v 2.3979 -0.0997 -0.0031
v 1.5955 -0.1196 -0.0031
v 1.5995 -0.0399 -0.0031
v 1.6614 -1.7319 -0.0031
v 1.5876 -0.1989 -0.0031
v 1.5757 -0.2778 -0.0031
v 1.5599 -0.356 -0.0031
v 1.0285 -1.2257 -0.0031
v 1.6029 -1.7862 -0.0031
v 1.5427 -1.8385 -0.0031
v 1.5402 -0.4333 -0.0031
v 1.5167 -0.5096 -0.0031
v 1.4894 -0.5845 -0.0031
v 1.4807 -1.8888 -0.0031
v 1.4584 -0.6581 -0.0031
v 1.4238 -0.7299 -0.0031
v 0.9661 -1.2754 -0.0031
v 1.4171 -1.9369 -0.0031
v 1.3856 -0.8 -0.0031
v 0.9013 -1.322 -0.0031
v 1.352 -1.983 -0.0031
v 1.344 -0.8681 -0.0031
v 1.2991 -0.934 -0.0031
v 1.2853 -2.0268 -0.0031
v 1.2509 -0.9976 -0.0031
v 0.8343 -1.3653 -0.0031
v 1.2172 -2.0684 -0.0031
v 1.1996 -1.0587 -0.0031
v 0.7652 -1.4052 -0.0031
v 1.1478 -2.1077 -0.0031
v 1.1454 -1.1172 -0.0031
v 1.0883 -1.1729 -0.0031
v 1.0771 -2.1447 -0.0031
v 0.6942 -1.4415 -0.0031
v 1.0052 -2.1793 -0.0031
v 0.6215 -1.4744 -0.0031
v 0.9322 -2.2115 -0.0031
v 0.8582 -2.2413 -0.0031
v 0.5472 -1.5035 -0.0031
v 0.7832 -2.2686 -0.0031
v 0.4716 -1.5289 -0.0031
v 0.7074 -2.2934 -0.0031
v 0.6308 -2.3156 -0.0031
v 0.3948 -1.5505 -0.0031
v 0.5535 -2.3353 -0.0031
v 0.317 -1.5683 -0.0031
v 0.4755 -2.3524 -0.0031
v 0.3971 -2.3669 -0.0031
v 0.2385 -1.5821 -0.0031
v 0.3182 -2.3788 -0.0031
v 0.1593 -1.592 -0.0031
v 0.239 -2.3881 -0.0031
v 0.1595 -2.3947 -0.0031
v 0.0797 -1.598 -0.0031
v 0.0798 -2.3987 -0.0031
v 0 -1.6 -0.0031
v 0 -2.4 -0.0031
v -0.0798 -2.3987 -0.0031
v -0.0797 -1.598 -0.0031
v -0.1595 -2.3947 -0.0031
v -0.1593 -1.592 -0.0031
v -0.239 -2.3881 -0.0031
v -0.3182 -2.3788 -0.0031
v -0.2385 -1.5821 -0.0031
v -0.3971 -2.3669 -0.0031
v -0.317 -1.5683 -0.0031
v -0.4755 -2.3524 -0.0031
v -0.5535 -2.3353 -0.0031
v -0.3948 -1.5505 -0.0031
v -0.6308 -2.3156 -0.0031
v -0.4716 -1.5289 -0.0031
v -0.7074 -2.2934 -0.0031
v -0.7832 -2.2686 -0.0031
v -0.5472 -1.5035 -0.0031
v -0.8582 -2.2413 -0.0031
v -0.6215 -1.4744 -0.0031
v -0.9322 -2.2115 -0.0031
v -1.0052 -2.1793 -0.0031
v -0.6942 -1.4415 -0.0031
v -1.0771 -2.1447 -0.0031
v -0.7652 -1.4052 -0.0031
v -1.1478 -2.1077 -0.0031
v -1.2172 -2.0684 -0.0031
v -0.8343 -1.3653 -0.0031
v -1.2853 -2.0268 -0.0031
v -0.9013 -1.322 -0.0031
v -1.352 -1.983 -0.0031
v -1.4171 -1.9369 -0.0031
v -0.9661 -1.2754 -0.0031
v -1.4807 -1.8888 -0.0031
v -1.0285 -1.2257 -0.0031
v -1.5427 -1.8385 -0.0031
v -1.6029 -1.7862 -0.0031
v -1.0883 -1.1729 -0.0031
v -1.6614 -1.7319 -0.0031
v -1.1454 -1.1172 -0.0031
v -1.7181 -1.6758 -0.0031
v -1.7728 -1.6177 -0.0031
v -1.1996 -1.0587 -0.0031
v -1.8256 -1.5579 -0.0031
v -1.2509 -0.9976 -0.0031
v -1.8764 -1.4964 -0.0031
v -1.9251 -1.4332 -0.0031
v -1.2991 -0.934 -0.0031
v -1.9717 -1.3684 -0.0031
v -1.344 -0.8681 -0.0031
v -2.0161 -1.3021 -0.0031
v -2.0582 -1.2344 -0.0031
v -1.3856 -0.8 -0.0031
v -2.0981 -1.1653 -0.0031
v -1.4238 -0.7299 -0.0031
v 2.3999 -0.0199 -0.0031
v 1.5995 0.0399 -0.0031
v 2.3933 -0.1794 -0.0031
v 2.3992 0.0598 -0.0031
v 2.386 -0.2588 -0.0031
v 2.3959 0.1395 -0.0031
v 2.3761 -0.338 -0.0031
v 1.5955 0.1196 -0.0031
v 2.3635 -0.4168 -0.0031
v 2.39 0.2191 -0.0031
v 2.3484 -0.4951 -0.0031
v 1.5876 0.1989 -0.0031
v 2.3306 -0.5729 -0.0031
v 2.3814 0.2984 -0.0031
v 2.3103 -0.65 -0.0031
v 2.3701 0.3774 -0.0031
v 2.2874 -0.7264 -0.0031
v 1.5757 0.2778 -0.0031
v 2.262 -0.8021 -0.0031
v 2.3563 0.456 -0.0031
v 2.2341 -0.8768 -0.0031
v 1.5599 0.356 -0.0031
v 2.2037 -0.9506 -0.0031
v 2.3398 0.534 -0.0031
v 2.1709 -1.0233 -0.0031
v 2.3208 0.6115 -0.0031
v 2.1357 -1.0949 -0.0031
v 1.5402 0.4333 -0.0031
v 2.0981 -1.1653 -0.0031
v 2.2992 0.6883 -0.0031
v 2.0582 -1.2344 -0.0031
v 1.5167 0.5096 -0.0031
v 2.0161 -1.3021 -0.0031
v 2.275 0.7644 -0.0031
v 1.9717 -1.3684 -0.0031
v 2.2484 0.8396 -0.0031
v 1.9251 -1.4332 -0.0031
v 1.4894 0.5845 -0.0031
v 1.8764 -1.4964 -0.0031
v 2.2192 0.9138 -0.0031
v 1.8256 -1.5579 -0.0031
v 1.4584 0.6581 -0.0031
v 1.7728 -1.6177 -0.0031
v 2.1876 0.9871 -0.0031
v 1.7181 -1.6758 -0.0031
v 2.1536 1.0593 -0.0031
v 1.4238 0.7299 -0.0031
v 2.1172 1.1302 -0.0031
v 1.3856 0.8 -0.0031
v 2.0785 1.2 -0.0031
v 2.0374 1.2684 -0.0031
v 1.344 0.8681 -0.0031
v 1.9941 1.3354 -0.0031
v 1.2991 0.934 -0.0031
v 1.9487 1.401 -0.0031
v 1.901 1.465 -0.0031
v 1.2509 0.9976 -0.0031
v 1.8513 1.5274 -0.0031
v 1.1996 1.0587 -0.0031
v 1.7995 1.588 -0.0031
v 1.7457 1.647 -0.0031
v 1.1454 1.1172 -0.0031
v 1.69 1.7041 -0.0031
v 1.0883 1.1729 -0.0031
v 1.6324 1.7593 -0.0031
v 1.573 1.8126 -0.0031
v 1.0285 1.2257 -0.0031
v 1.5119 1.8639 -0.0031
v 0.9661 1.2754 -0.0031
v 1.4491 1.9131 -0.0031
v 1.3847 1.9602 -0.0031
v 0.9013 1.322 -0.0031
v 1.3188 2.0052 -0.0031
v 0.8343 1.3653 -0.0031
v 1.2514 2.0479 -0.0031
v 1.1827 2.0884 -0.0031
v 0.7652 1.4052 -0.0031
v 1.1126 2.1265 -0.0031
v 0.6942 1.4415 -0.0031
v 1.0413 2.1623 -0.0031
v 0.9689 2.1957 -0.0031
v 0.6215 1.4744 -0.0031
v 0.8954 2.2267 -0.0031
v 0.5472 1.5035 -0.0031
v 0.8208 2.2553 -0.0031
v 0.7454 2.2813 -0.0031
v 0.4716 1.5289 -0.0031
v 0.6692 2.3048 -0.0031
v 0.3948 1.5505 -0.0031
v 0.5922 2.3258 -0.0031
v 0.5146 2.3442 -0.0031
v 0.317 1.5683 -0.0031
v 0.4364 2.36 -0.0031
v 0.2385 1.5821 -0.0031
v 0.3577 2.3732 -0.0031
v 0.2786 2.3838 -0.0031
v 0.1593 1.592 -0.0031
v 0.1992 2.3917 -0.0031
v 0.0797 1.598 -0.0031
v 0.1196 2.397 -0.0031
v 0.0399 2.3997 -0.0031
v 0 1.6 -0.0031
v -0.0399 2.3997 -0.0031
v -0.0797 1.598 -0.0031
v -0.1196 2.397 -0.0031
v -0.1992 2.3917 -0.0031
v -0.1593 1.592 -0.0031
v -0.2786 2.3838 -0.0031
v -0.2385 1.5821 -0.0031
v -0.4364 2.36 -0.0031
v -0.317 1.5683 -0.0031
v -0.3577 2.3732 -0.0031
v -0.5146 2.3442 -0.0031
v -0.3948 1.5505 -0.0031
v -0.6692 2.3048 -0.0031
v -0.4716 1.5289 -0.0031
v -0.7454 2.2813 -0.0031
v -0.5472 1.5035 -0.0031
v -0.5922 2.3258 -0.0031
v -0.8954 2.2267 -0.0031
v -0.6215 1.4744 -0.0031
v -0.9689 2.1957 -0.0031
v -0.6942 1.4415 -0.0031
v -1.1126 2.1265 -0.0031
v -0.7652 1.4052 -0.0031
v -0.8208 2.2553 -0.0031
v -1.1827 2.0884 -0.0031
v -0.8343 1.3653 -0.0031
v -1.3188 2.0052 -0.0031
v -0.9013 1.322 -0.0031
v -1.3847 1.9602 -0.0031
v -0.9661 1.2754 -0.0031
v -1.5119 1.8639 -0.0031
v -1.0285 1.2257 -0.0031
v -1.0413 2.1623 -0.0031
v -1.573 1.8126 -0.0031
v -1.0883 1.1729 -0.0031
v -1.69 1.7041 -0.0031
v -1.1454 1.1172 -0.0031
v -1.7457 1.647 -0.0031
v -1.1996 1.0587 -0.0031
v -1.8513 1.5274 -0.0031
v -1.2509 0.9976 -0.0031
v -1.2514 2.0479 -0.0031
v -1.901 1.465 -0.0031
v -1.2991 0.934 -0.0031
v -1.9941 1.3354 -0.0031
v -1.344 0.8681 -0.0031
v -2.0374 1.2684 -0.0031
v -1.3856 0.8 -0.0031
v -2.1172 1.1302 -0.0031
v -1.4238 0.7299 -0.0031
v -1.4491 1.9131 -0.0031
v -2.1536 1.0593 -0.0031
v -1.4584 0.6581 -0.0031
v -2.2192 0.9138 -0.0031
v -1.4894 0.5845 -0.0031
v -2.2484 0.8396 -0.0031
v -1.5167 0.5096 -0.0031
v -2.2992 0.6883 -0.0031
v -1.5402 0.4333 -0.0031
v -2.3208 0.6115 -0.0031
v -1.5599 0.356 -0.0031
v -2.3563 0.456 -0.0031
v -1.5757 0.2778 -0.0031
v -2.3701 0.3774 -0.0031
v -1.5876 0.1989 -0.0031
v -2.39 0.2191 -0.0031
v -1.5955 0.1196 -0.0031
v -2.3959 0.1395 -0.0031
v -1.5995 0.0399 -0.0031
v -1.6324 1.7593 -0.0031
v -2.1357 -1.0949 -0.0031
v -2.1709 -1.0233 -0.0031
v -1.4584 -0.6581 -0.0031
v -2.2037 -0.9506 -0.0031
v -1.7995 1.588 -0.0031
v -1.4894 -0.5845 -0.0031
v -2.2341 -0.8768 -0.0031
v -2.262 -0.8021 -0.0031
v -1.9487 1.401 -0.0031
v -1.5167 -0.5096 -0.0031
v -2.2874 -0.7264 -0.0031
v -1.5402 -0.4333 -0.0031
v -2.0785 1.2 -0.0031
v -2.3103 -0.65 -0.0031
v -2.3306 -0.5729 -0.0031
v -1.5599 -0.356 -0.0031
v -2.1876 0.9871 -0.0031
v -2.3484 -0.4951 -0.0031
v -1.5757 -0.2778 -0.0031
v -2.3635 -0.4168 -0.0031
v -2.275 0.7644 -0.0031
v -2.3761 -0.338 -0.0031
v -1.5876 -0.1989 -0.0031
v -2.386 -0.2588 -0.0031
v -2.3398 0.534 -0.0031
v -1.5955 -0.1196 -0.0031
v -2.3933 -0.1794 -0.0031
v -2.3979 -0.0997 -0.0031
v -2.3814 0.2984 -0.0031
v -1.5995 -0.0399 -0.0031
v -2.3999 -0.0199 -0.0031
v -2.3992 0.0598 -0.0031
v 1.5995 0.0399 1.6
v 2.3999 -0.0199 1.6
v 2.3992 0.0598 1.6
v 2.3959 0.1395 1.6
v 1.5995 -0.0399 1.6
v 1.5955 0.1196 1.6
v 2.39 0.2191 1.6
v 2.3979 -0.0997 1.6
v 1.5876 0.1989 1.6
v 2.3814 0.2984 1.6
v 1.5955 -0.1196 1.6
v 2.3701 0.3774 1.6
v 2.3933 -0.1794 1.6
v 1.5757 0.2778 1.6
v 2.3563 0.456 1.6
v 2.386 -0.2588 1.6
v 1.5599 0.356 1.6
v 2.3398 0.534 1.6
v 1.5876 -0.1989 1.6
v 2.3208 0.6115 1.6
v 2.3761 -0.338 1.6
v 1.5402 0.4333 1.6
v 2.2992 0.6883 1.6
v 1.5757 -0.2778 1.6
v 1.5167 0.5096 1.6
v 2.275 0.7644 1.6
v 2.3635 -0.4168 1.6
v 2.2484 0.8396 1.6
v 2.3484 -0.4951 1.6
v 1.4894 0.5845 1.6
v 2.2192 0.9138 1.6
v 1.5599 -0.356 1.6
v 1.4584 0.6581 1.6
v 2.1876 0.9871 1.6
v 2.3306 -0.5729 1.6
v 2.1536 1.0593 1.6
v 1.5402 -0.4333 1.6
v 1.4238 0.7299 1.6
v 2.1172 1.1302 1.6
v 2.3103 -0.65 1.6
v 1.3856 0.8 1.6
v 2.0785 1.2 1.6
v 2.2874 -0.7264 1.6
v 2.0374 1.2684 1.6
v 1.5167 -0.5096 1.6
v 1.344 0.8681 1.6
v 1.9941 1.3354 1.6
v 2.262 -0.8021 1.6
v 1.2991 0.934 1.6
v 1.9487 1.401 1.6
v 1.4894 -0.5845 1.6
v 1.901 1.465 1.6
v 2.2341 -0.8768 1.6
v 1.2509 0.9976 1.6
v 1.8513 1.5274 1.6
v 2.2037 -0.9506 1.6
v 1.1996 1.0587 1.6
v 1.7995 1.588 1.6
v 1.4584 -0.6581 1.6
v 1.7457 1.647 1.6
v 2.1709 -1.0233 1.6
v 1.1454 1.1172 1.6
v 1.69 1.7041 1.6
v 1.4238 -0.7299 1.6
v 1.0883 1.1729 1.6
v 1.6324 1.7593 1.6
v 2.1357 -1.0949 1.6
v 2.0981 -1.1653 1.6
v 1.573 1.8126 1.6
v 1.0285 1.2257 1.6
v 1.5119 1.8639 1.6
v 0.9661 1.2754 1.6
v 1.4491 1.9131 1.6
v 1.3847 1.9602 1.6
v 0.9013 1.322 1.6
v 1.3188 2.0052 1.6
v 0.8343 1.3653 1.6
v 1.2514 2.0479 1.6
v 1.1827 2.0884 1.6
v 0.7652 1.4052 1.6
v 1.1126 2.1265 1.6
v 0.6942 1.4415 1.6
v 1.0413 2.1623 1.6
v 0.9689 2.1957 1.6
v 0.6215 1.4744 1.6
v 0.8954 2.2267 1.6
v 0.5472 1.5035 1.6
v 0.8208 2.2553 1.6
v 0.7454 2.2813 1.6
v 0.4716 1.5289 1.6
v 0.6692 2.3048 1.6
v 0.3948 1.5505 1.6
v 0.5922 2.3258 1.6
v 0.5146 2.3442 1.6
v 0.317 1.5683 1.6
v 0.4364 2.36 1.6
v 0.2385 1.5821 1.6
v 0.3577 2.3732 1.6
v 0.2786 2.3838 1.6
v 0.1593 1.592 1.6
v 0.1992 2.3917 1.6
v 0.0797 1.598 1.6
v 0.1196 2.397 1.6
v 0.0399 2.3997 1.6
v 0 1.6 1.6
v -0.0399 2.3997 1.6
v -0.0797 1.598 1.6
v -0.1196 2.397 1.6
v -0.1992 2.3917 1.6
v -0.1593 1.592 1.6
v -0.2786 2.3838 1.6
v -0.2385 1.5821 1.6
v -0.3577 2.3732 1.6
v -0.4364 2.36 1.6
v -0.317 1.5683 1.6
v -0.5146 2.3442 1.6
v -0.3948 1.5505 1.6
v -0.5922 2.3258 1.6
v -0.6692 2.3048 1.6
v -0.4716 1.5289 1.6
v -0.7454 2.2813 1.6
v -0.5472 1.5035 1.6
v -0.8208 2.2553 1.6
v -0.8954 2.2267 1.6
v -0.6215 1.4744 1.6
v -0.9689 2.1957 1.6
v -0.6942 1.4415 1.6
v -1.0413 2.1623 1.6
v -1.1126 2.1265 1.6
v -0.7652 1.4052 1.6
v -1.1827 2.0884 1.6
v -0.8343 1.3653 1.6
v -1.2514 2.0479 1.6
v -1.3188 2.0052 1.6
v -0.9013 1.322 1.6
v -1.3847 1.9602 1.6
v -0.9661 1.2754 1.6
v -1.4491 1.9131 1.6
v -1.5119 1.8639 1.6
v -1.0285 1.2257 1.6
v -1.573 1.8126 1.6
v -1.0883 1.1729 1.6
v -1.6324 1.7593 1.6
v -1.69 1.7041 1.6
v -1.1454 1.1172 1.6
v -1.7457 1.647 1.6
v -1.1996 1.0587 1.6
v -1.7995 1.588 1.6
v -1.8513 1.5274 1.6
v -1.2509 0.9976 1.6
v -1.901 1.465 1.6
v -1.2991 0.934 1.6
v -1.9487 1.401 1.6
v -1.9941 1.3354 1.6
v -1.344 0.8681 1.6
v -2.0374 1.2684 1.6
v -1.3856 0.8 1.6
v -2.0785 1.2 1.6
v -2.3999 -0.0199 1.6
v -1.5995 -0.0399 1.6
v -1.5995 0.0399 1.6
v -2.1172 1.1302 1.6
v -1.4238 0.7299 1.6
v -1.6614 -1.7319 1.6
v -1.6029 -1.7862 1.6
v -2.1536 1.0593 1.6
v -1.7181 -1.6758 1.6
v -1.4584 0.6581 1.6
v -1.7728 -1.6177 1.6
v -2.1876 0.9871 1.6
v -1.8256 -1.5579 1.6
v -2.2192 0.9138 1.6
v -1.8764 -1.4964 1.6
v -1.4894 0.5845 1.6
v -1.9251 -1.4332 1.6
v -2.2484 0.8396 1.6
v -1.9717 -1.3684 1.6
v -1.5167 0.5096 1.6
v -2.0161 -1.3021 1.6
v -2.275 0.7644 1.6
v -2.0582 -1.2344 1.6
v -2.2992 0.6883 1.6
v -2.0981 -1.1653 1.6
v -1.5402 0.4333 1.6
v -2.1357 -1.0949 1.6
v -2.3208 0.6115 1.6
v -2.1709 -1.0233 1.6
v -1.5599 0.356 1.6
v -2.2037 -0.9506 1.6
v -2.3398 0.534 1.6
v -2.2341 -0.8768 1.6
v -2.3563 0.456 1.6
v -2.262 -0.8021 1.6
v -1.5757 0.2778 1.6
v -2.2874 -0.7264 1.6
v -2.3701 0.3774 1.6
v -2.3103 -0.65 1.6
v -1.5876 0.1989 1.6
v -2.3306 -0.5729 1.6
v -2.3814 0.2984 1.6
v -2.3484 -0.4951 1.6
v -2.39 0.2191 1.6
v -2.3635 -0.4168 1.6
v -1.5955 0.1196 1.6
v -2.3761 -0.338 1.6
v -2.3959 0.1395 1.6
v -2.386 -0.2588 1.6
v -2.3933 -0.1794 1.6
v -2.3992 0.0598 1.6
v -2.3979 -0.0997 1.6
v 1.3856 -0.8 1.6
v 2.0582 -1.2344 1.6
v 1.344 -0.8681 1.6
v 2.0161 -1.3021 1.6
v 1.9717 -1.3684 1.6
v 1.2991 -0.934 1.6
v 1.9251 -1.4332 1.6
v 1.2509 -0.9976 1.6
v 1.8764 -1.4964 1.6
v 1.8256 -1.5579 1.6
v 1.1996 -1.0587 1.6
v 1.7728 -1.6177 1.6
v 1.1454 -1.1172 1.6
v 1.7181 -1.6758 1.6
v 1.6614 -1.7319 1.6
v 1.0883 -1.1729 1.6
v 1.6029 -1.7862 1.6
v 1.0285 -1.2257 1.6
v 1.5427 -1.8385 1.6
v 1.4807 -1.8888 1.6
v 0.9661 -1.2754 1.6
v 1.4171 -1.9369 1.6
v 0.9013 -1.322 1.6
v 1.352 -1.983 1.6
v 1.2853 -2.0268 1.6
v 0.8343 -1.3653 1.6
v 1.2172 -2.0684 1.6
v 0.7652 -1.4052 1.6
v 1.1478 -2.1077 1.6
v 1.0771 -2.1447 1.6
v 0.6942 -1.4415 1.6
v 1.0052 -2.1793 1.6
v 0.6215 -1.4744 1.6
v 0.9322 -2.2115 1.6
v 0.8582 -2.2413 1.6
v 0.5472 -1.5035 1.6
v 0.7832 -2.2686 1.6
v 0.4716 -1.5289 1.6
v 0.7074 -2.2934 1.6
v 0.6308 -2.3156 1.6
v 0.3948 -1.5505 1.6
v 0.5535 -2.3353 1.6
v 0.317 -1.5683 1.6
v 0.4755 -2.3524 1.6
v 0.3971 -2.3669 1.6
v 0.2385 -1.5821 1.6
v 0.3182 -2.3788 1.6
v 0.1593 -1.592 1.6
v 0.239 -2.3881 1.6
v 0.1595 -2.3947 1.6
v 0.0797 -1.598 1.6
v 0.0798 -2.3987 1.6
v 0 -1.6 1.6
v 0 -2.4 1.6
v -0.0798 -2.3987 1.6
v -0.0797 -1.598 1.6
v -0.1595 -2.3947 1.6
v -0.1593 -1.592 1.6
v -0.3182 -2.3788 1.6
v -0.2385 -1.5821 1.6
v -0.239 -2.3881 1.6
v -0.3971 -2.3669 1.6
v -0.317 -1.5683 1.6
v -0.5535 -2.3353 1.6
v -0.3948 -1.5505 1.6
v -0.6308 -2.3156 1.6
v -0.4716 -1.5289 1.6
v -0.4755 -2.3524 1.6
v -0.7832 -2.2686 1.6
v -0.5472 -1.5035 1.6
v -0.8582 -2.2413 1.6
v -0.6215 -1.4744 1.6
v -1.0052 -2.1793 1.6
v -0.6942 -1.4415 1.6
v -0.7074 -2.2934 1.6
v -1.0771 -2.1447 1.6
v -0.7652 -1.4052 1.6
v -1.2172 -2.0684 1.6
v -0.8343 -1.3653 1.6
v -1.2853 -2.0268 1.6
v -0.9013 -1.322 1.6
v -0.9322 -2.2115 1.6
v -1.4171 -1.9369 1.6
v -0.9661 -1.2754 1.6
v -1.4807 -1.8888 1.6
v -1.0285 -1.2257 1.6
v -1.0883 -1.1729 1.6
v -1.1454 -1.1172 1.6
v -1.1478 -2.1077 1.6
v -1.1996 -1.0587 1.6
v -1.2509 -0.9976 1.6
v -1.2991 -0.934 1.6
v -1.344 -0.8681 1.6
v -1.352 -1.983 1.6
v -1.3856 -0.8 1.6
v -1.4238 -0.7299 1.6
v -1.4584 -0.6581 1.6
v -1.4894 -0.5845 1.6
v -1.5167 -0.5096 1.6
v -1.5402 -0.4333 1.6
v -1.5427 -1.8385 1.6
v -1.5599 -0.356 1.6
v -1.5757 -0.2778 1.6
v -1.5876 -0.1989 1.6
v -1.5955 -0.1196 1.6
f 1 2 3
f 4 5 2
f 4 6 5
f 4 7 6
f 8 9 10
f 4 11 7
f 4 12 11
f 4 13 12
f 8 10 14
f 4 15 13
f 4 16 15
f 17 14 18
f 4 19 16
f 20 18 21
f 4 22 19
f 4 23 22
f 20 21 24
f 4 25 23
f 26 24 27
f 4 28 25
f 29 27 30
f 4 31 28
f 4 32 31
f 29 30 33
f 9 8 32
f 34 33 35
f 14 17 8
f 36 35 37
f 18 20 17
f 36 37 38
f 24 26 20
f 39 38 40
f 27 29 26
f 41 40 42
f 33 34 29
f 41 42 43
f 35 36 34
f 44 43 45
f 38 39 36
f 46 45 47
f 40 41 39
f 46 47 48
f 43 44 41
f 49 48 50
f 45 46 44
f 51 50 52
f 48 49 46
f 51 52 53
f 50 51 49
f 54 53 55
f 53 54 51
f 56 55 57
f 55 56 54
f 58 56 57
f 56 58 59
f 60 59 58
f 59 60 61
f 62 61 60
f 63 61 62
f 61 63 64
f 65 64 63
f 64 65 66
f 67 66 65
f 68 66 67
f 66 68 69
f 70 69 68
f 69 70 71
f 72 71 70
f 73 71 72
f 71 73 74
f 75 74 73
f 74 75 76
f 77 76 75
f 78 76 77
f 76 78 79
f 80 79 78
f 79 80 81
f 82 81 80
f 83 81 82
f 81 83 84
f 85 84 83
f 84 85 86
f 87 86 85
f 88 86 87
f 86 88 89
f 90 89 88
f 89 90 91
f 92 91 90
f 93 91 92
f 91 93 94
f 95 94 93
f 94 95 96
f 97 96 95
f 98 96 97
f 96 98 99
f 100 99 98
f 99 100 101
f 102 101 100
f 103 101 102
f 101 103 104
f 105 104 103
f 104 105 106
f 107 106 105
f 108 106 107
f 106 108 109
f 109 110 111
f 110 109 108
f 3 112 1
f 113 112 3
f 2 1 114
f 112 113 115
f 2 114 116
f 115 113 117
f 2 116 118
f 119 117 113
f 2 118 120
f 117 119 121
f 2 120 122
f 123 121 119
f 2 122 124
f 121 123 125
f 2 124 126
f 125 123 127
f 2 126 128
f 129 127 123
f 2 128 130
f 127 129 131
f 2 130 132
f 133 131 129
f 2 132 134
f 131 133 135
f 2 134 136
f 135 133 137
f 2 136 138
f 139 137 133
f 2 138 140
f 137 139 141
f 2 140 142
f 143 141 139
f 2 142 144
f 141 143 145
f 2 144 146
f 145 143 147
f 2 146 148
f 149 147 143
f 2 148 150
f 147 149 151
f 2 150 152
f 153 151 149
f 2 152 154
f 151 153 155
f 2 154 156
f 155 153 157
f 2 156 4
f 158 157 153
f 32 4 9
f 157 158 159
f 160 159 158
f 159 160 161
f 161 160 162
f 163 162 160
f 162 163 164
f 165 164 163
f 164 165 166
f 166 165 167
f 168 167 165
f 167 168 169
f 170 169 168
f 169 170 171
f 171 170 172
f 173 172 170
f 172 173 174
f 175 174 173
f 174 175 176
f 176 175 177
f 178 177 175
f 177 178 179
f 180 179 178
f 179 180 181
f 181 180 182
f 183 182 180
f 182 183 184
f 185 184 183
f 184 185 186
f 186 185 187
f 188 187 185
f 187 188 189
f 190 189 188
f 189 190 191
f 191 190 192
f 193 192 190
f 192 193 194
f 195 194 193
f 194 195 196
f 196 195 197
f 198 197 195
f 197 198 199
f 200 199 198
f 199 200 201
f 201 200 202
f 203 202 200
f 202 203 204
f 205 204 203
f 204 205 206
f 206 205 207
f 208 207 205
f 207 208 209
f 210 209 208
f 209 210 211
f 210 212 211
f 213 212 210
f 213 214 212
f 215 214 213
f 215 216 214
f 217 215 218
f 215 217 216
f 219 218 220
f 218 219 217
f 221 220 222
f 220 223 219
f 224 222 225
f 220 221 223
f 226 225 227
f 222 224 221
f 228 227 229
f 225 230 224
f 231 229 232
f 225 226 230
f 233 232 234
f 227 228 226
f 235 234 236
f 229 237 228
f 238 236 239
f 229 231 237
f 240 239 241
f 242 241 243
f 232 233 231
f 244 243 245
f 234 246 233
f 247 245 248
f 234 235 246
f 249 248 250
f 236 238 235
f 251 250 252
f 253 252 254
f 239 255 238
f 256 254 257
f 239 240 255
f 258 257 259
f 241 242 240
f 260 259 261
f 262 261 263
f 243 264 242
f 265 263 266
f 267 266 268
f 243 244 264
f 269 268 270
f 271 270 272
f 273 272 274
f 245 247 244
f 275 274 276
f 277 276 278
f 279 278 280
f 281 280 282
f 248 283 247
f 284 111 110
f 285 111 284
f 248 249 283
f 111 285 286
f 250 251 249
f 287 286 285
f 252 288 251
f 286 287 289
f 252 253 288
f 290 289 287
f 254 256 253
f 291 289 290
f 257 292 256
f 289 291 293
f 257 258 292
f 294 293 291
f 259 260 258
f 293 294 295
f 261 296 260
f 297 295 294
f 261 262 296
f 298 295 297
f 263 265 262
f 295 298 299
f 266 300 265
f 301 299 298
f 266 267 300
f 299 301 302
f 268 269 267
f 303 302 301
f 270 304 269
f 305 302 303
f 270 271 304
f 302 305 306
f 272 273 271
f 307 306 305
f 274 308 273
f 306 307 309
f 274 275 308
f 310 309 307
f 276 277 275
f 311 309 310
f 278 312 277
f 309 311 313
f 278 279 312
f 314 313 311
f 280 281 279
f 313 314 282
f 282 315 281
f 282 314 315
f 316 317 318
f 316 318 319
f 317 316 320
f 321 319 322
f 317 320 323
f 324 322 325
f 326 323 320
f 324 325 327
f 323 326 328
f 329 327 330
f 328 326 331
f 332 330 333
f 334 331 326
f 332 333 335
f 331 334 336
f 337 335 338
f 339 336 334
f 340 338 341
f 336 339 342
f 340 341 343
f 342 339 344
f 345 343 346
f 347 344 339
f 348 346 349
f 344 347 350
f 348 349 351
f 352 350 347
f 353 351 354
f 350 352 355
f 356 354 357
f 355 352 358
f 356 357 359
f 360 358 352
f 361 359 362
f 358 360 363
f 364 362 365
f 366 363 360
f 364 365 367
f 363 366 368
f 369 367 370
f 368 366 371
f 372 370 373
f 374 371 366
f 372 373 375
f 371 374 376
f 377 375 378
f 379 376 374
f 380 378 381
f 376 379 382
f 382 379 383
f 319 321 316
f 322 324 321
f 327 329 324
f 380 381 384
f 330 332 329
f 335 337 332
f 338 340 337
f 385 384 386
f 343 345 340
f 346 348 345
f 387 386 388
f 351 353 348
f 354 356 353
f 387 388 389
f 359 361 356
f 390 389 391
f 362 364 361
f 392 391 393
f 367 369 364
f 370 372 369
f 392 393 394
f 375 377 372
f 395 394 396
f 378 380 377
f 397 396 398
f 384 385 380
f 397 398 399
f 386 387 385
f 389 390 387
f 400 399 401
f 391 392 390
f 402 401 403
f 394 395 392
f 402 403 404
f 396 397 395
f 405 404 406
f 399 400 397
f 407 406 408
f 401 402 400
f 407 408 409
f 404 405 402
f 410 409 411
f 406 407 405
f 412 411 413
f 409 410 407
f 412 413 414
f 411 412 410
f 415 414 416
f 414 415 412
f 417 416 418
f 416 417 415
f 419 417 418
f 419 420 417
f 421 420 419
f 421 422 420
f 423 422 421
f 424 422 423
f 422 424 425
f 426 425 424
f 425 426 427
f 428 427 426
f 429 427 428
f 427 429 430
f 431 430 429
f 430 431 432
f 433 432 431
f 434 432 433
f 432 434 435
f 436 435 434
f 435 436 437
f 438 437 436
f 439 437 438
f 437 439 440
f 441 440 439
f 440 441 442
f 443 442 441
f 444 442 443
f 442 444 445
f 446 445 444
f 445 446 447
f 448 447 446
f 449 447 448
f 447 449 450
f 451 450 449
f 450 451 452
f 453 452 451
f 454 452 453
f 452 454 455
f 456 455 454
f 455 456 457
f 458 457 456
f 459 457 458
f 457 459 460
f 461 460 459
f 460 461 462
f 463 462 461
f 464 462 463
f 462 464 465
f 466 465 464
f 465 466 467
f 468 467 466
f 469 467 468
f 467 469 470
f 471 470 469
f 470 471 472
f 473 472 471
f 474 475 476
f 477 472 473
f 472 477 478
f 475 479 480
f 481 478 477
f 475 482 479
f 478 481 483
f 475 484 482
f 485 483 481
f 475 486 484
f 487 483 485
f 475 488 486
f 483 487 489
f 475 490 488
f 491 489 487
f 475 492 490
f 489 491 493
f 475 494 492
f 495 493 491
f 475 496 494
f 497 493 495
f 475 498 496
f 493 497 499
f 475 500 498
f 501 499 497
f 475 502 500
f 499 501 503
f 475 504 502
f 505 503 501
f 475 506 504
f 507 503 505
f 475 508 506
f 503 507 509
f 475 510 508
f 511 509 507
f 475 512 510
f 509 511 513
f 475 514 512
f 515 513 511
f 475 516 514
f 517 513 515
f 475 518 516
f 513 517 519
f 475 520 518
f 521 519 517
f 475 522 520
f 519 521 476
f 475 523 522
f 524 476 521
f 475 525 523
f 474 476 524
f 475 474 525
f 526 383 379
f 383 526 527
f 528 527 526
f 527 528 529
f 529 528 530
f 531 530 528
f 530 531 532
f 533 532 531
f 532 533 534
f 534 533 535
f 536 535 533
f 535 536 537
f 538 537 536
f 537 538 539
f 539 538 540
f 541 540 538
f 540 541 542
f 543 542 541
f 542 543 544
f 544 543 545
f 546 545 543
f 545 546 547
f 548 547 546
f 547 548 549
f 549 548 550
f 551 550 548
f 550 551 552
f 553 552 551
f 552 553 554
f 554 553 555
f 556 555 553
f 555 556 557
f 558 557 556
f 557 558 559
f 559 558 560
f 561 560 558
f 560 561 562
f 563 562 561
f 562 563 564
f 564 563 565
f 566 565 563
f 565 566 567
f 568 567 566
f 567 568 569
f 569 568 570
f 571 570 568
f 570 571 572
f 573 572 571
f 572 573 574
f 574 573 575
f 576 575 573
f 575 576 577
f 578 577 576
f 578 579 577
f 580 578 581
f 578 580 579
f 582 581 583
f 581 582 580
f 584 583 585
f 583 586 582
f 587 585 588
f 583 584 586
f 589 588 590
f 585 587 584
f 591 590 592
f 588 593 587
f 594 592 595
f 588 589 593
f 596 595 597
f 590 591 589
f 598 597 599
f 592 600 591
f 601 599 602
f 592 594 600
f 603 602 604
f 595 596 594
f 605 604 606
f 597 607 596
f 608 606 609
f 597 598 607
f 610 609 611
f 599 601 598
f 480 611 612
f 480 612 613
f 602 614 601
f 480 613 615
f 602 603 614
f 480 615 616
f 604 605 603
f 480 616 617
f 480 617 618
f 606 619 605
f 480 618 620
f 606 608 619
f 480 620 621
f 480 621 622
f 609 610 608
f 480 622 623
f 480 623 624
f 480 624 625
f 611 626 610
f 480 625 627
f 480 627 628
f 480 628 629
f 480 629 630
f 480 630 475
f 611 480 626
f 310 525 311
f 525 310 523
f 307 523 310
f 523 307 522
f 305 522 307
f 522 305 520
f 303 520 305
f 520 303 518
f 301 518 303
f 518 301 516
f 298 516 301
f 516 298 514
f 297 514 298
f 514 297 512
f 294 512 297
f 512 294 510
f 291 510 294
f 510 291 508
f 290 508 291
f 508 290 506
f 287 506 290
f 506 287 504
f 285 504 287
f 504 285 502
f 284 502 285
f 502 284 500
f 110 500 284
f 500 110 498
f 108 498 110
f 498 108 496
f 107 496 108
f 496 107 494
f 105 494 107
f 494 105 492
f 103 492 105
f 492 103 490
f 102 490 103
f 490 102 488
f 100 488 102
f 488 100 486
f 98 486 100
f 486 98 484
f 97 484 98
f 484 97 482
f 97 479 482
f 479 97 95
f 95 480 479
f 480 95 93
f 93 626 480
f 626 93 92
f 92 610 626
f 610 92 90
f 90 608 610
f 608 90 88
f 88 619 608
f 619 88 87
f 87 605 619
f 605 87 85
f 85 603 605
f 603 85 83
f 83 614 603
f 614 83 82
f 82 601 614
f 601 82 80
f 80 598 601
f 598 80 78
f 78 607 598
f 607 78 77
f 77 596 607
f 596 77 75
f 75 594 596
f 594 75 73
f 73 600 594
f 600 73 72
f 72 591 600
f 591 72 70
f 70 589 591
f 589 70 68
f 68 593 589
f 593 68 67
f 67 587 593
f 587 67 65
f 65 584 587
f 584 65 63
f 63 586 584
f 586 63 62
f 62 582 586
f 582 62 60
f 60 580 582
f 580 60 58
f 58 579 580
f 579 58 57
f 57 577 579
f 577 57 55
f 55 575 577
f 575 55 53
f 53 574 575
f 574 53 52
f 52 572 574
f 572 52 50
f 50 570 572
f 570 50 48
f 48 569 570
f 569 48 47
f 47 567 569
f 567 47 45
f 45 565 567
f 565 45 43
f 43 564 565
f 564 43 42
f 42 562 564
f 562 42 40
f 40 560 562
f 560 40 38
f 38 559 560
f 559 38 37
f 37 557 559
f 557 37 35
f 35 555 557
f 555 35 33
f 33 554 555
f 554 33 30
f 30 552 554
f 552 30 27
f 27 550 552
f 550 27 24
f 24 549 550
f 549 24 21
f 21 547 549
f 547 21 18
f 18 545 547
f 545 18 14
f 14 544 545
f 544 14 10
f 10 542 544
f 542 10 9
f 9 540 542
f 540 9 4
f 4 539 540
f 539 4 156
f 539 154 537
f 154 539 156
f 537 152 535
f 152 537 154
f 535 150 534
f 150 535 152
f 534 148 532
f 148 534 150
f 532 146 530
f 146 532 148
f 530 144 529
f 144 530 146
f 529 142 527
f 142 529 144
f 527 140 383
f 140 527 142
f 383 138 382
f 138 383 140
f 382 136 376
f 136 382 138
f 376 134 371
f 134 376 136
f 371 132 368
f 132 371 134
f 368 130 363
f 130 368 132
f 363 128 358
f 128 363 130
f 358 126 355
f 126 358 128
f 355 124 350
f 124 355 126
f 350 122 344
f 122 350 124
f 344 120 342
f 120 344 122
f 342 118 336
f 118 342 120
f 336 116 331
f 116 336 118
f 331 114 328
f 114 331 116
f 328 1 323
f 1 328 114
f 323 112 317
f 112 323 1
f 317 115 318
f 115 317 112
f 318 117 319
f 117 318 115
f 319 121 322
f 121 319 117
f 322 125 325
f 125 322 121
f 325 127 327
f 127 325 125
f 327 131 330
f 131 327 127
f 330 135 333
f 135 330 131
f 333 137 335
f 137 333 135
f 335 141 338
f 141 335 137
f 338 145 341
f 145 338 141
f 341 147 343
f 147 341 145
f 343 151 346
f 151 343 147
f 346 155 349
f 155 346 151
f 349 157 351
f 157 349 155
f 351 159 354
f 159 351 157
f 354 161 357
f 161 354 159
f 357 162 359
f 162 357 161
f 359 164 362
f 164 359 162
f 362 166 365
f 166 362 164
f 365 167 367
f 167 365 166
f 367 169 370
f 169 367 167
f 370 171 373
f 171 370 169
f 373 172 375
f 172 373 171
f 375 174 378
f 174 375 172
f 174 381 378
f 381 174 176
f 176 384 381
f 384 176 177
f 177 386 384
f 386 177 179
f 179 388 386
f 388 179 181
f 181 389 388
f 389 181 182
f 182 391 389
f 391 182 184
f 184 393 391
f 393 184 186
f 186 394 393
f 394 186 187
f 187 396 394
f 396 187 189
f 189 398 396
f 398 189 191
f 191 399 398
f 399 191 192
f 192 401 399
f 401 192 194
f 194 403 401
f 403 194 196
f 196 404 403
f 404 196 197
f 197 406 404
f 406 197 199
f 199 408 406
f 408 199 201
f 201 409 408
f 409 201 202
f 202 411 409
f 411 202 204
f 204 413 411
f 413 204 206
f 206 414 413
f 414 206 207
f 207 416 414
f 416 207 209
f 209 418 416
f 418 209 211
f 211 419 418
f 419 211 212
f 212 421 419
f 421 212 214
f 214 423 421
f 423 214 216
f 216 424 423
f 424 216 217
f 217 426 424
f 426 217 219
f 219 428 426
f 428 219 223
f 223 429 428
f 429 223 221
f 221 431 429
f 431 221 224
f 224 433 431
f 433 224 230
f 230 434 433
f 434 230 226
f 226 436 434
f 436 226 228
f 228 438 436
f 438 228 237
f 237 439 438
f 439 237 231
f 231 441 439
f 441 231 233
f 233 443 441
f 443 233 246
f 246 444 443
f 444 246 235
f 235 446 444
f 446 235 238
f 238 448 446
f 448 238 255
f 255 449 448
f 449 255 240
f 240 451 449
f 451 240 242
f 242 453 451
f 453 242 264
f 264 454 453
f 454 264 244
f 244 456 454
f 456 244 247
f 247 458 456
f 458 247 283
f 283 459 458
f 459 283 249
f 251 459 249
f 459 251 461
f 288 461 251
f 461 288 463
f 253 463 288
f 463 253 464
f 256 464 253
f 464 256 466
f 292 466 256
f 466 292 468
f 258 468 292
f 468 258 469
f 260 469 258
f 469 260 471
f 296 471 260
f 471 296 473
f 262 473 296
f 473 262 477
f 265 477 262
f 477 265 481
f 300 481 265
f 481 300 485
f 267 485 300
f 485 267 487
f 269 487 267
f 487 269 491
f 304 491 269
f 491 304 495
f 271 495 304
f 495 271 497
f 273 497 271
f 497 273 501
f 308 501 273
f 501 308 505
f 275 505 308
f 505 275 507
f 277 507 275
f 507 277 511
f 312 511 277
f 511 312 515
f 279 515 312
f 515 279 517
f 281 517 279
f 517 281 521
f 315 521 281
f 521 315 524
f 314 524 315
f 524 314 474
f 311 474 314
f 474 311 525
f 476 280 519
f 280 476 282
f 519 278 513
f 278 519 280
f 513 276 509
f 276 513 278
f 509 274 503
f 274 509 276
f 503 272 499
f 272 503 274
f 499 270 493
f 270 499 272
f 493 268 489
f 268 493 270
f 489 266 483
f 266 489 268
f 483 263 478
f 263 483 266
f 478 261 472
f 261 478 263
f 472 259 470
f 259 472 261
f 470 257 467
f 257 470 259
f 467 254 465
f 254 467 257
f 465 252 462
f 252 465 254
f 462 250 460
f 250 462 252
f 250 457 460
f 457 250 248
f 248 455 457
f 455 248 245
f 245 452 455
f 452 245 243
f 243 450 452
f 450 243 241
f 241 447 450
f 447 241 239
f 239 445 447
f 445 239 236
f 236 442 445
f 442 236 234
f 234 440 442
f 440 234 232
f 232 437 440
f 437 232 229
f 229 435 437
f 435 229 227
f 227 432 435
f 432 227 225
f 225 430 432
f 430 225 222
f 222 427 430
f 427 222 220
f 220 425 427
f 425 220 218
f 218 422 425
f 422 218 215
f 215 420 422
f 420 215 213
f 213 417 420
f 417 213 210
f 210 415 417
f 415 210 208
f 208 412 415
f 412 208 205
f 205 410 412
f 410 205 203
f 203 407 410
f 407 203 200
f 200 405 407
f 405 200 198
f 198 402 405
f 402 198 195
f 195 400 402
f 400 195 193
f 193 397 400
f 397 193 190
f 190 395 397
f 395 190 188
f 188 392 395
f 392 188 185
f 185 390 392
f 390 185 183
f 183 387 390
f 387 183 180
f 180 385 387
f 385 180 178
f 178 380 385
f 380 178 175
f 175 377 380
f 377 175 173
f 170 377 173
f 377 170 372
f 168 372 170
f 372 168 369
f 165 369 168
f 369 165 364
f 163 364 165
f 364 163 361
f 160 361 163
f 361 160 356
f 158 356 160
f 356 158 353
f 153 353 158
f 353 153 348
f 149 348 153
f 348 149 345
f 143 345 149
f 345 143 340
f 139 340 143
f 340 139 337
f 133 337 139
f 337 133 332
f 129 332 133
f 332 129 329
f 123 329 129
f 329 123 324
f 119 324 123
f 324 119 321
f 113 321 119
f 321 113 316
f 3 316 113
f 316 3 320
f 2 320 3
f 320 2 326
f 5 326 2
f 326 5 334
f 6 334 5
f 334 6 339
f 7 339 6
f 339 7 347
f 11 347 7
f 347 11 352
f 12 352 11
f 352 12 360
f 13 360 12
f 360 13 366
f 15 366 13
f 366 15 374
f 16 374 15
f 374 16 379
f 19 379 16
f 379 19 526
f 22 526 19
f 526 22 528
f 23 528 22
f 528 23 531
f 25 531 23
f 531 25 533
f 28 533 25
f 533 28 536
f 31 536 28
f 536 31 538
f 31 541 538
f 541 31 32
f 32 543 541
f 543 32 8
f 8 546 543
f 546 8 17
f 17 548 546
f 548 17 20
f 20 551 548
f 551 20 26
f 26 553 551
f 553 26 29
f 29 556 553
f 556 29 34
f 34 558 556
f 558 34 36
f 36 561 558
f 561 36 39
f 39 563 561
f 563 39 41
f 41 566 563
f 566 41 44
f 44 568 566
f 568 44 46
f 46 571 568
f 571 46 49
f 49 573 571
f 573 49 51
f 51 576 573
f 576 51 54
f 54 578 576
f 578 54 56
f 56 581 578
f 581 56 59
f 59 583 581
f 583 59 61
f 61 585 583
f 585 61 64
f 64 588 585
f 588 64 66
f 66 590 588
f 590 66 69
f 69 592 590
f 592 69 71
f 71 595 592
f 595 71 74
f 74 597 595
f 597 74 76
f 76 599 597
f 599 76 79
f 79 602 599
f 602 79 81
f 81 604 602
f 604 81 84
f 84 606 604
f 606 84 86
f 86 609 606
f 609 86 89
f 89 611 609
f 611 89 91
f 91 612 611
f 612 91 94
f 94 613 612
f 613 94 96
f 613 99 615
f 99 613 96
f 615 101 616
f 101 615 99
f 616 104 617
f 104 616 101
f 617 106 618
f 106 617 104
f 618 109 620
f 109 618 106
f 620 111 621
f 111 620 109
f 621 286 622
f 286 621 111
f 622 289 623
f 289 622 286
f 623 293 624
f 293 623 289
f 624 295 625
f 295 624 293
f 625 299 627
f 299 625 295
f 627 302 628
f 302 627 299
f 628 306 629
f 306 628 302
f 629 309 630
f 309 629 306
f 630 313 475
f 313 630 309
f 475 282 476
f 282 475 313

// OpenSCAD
use <../lib.scad>
use <s/4181s01.scad>
use <s/4181s02.scad>
use <../p/stud2.scad>
$fa=1; $fs=0.2;
function ldraw_lib__4182p06(realsolid=false) = [
// 0 Train Door  1 x  4 x  5 Right with Red/Blue Stripe Pattern
// 0 Name: 4182p06.dat
// 0 Author: William Howard [WilliamH]
// 0 !LDRAW_ORG Part UPDATE 2009-01
// 0 !LICENSE Licensed under CC BY 2.0 and CC BY 4.0 : see CAreadme.txt
// 
// 0 BFC CERTIFY CCW
  [0,"BFC","CERTIFY"],
  [0,"BFC","CCW"],
// 
// 0 !HISTORY 2009-05-02 [PTadmin] Official Update 2009-01
// 
// 
// 1 16 0 0 0 1 0 0 0 1 0 0 0 1 stud2.dat
  [1,16,0,0,0,1,0,0,0,1,0,0,0,1, ldraw_lib__stud2(realsolid)],
// 1 16 0 0 0 -1 0 0 0 1 0 0 0 1 s\4181s01.dat
  [1,16,0,0,0,-1,0,0,0,1,0,0,0,1, ldraw_lib__s__4181s01(realsolid)],
// 1 16 0 72 0 -1 0 0 0 1 0 0 0 1 s\4181s02.dat
  [1,16,0,72,0,-1,0,0,0,1,0,0,0,1, ldraw_lib__s__4181s02(realsolid)],
// 1 4 0 80 0 -1 0 0 0 1 0 0 0 1 s\4181s02.dat
  [1,4,0,80,0,-1,0,0,0,1,0,0,0,1, ldraw_lib__s__4181s02(realsolid)],
// 1 16 0 88 0 -1 0 0 0 1 0 0 0 1 s\4181s02.dat
  [1,16,0,88,0,-1,0,0,0,1,0,0,0,1, ldraw_lib__s__4181s02(realsolid)],
// 1 1 0 96 0 -1 0 0 0 3 0 0 0 1 s\4181s02.dat
  [1,1,0,96,0,-1,0,0,0,3,0,0,0,1, ldraw_lib__s__4181s02(realsolid)],
// 0
];
module ldraw_lib__4182p06(step=0, col=false, unit=2/5, alt=false, line=0.2, solid=!$preview)
    makepoly(ldraw_lib__4182p06(solid), step=step, col=col, unit=unit, alt=alt, line=line, solid=solid);
ldraw_lib__4182p06(line=0.2);
